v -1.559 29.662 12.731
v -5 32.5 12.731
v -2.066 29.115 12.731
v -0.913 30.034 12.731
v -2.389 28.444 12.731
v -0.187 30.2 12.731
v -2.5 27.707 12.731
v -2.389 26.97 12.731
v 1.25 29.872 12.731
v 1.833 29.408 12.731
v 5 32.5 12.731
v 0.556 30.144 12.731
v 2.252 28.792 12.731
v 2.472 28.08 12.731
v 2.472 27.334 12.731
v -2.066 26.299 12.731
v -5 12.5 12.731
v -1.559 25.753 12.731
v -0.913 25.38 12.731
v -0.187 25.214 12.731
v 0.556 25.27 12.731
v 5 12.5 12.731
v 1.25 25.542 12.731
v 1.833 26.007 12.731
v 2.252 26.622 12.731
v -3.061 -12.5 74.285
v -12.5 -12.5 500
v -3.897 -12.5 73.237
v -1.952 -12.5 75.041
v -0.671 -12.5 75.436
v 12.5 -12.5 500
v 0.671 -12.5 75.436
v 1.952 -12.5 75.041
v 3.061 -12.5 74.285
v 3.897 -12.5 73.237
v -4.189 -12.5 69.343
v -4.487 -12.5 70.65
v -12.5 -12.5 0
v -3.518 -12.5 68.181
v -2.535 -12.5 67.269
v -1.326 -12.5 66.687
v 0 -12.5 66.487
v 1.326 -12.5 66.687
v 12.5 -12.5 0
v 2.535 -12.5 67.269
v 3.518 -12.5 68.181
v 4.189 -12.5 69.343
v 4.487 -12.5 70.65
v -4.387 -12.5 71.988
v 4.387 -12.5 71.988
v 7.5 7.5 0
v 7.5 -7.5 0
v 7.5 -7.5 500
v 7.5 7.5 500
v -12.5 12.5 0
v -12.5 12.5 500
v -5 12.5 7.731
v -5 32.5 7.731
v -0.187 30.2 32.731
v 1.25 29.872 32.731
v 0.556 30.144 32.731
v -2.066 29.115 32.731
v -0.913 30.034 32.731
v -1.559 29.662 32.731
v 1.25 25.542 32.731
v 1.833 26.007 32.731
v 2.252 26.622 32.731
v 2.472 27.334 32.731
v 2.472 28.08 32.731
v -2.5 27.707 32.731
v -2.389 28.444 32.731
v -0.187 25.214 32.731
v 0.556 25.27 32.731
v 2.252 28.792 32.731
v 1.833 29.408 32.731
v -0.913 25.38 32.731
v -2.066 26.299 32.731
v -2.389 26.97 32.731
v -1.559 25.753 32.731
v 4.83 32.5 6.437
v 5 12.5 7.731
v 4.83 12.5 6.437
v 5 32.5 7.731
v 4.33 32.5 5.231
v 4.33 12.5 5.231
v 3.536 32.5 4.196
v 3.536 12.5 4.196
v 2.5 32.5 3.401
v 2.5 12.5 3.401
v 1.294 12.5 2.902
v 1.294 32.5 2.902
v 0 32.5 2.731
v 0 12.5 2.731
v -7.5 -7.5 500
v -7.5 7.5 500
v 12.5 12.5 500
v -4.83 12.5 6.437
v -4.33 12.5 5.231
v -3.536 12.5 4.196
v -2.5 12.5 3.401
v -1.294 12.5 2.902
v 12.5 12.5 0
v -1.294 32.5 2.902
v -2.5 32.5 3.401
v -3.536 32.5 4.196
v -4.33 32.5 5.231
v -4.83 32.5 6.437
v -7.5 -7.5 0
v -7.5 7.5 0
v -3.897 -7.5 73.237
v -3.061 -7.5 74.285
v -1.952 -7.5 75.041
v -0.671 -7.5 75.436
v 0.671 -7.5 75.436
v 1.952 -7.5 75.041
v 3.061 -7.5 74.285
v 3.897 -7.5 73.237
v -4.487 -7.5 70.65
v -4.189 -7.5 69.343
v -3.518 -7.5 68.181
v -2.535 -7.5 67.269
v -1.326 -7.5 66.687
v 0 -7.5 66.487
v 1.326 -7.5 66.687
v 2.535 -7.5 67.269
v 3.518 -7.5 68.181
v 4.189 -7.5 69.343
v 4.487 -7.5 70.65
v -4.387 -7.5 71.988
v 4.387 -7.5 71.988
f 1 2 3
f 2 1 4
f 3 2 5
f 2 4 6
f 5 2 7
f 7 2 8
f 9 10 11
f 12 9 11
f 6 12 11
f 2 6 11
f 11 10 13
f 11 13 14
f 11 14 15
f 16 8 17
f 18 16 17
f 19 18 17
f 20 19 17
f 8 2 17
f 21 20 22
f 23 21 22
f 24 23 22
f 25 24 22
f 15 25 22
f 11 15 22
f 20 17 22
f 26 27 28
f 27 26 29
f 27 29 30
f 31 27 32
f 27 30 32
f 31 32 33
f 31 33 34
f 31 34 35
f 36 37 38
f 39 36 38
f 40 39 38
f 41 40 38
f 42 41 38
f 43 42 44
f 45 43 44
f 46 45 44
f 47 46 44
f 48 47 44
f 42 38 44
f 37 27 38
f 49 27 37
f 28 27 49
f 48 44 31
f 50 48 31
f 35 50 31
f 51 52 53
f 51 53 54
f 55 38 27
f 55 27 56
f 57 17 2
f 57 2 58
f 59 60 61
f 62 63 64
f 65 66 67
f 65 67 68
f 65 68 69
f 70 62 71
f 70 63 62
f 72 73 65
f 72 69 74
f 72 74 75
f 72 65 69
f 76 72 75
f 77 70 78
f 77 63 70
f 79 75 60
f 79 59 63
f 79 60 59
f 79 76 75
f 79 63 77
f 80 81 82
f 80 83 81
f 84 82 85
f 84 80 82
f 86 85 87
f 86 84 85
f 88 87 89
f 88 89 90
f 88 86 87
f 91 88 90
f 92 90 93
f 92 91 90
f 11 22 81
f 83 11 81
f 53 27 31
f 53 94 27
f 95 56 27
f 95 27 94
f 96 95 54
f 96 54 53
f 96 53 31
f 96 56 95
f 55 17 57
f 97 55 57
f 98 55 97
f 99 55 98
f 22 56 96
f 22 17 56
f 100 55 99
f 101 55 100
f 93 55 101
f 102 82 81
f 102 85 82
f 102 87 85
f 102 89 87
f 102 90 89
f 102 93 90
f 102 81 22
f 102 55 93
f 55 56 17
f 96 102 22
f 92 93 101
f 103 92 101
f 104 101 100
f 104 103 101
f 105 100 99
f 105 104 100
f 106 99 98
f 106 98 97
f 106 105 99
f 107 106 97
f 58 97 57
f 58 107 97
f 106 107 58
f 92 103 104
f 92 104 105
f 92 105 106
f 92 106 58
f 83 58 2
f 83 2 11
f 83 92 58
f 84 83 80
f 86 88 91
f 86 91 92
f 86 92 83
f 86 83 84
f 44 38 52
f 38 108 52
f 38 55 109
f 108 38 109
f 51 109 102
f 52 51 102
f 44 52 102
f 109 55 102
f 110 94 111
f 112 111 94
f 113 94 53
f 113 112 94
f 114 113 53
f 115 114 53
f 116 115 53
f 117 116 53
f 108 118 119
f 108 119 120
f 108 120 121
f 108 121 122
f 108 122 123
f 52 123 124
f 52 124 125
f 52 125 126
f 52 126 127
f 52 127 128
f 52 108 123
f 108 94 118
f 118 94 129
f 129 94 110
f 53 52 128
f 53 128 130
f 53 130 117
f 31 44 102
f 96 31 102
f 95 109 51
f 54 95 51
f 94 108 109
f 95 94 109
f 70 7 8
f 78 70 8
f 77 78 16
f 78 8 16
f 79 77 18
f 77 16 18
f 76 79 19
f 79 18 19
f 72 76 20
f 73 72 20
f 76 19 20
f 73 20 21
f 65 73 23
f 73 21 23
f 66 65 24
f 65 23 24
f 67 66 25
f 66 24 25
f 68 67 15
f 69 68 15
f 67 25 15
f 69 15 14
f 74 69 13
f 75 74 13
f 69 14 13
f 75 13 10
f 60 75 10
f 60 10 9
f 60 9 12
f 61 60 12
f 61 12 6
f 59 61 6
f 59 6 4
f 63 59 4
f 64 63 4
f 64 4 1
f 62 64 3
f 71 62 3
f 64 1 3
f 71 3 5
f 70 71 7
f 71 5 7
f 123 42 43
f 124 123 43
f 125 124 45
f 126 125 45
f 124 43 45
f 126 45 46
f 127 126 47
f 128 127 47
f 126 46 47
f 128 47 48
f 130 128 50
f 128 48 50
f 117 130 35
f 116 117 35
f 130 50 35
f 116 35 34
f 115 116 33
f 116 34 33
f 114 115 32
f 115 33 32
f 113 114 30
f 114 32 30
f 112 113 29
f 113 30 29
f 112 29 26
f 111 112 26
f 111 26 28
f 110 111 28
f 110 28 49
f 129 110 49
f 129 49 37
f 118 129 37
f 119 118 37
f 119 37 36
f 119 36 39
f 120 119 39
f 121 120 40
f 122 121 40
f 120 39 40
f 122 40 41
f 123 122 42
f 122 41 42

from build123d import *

# Parameters (mm, degrees)
SKETCH1_W           = 25
SKETCH1_H           = 25
SKETCH1_W_2         = 15
SKETCH1_H_2         = 15
BOSS_EXTRUDE1_DEPTH = 500
SKETCH2_W           = 10
SKETCH2_H           = 10
BOSS_EXTRUDE2_DEPTH = 20
SKETCH3_R           = 2.5
BOSS_EXTRUDE3_DEPTH = 20
FILLET2_R           = 5
FILLET3_R           = 5
SKETCH4_R           = 4.5
CUT_EXTRUDE1_DEPTH  = 5


with BuildPart() as part:
    # Sketch1 → Boss-Extrude1 (new body)
    with BuildSketch(Plane.XY):
        Rectangle(SKETCH1_W, SKETCH1_H)
        Rectangle(SKETCH1_W_2, SKETCH1_H_2, mode=Mode.SUBTRACT)
    extrude(amount=BOSS_EXTRUDE1_DEPTH)

    # Sketch2 → Boss-Extrude2 (add)
    with BuildSketch(Plane(origin=(0, 12.5, 0), x_dir=(1, 0, 0), z_dir=(0, 1, 0))):
        with Locations((0, -7.731161073)):
            Rectangle(SKETCH2_W, SKETCH2_H)
    extrude(amount=BOSS_EXTRUDE2_DEPTH)

    # Sketch3 → Boss-Extrude3 (add)
    with BuildSketch(Plane.XY.offset(12.731161073)):
        with Locations(Location((0, 27.707080849, 0), (0, 0, 180))):
            Circle(SKETCH3_R)
    extrude(amount=BOSS_EXTRUDE3_DEPTH)

    # Fillet2
    fillet2_edges = [part.edges().sort_by_distance(p)[0] for p in [
        (5, 22.5, 2.731161073),
    ]]
    fillet(fillet2_edges, radius=FILLET2_R)

    # Fillet3
    fillet3_edges = [part.edges().sort_by_distance(p)[0] for p in [
        (-5, 22.5, 2.731161073),
    ]]
    fillet(fillet3_edges, radius=FILLET3_R - 0.0001)  # a hair under: the kernel refuses the full size

    # Sketch4 → Cut-Extrude1 (cut)
    with BuildSketch(Plane.XZ.offset(12.5)):
        with Locations(Location((0, 70.986744053, 0), (0, 0, 270))):
            Circle(SKETCH4_R)
    extrude(amount=-CUT_EXTRUDE1_DEPTH, mode=Mode.SUBTRACT)


solid = part.part
